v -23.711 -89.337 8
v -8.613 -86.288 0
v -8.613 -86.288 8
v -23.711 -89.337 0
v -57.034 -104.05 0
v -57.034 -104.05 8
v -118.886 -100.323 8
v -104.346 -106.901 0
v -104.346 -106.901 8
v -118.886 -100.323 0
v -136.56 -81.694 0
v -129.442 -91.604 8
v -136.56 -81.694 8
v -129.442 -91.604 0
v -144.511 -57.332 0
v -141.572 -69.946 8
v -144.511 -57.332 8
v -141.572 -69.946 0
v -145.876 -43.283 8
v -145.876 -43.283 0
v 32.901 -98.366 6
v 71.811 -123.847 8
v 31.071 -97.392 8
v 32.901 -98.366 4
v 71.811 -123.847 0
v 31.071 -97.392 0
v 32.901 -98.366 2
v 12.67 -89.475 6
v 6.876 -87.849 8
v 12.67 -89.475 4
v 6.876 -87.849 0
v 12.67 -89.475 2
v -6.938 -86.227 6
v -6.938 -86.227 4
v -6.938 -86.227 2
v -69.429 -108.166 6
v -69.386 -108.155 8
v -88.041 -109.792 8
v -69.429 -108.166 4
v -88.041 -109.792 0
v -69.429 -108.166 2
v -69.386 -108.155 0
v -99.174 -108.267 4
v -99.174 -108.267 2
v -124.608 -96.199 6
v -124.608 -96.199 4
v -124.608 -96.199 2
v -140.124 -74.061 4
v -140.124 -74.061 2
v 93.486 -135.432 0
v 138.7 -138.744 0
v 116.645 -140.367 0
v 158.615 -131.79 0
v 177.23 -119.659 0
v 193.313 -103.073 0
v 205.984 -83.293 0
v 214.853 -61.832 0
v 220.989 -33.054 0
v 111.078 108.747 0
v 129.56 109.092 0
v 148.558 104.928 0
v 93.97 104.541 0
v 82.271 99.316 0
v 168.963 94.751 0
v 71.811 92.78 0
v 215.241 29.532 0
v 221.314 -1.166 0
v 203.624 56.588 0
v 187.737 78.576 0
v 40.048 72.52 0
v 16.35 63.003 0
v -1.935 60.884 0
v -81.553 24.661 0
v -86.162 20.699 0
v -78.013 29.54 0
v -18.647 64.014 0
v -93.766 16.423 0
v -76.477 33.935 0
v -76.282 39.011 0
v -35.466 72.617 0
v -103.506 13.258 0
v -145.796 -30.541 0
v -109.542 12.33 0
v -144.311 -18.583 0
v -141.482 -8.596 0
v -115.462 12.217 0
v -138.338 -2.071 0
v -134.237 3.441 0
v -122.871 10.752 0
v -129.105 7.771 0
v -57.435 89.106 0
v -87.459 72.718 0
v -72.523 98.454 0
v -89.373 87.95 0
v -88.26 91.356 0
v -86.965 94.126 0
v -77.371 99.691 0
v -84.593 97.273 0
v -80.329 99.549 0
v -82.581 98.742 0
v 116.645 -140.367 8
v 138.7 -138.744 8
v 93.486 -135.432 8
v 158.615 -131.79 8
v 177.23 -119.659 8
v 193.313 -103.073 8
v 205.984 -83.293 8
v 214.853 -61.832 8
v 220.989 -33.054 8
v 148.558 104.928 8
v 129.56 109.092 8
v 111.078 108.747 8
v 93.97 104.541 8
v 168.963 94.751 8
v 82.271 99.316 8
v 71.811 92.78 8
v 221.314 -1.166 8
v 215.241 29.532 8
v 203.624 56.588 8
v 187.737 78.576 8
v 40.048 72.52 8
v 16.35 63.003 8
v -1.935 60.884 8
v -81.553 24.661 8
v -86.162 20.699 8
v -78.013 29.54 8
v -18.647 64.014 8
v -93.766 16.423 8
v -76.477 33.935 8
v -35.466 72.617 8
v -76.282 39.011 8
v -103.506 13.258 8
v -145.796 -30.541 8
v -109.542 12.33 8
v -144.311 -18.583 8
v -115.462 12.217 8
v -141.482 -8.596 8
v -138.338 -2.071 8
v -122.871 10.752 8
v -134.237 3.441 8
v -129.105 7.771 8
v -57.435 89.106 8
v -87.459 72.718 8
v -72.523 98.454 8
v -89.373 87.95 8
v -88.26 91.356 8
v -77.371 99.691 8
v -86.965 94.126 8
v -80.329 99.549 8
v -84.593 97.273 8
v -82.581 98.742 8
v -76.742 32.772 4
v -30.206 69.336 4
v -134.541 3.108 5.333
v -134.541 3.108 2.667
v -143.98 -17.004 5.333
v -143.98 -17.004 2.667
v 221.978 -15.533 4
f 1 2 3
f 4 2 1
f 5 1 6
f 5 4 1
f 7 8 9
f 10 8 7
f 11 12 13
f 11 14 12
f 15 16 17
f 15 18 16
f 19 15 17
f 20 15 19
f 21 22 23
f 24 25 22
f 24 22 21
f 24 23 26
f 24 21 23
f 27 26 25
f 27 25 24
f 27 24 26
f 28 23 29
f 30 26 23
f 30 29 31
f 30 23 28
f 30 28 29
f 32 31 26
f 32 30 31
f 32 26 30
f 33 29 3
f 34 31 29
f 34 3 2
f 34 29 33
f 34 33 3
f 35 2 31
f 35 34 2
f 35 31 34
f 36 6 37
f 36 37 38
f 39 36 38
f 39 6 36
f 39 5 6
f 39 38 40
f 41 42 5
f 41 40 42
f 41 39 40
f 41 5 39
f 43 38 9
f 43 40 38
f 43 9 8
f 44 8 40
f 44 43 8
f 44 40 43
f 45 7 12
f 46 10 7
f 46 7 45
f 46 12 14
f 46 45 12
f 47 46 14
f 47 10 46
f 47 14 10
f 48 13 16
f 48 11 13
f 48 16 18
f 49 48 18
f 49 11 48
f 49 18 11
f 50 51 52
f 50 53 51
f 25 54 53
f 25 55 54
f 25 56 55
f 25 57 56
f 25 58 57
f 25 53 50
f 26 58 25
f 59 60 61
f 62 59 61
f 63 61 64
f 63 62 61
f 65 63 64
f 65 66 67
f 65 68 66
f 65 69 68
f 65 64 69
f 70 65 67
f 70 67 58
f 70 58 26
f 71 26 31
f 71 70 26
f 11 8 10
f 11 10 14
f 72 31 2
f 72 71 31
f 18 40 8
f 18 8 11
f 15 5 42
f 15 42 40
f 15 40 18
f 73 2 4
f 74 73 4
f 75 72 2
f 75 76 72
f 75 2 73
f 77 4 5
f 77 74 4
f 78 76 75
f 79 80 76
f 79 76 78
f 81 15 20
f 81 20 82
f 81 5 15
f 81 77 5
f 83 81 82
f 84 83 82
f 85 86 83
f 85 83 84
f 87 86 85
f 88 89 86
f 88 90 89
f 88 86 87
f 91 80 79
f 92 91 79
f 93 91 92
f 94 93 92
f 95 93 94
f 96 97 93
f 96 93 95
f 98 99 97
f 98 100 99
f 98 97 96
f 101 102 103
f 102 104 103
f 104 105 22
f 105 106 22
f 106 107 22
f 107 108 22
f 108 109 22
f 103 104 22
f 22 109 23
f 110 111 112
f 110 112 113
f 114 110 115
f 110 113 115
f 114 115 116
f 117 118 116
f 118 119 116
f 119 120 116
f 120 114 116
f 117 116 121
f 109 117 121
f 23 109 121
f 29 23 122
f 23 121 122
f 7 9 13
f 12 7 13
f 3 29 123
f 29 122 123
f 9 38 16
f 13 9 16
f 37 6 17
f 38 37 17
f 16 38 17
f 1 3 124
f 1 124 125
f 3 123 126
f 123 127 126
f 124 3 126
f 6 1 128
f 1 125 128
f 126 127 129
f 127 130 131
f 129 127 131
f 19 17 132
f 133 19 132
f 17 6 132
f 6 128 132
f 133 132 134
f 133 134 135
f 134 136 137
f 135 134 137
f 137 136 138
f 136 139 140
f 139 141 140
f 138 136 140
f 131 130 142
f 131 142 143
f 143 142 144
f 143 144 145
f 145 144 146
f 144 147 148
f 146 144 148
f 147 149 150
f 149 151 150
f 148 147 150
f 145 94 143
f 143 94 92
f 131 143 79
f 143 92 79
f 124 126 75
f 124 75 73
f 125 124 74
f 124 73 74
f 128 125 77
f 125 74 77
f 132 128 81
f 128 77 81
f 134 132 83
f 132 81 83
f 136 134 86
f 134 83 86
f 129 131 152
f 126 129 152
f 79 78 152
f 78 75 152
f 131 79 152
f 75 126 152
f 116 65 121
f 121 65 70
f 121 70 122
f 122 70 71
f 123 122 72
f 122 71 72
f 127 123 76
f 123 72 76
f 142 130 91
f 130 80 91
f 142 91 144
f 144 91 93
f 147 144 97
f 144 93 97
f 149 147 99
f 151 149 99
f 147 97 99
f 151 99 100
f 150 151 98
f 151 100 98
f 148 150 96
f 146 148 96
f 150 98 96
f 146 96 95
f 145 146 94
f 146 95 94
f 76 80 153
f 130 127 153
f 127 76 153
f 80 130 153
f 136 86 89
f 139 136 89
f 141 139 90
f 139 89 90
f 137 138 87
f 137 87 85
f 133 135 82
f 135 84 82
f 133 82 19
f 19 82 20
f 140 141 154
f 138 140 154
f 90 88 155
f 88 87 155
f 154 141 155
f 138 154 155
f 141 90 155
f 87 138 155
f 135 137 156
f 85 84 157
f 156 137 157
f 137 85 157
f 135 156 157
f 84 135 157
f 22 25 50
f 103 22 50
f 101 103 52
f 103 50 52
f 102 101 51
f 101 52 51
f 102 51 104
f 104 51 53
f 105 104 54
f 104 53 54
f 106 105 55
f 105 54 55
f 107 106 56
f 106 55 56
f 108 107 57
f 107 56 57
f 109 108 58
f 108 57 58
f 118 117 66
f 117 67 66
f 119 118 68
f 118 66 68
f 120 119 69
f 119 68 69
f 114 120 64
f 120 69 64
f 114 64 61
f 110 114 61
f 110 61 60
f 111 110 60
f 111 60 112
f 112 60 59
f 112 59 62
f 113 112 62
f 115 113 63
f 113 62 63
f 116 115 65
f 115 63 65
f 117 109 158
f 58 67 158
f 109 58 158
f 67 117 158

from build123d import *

# Parameters (mm, degrees)
F1_DEPTH = 8


with BuildPart() as f1:
    # F0 (on Top) → F1 (new body)
    with BuildSketch(Plane.XY):
        with BuildLine():
            add(Edge.make_bspline(
                [(71.8108263604, -123.8465007597), (47.7003894889, -106.5138372126), (-7.1023466925, -67.7010548051), (-65.7469849132, -118.3312863438), (-132.354363187, -102.6557773389), (-144.8947489305, -66.4196911039), (-145.8762223824, -43.2833050614)],
                knots=[0, 0, 0, 0, 0.2870393338, 0.537090623, 0.7679648384, 1, 1, 1, 1], degree=3))
            add(Edge.make_bspline(
                [(71.8108263604, -123.8465007597), (221.9776217834, -231.7995748847), (221.9776217834, -15.5333050614), (221.9776217834, 200.732964762), (71.8108263604, 92.7798906369)],
                knots=[2.6189550017, 2.6189550017, 2.6189550017, 4.7123889804, 4.7123889804, 6.805822959, 6.805822959, 6.805822959], degree=2, weights=[1, 0.500416121, 1, 0.500416121, 1]))
            add(Edge.make_bspline(
                [(71.8108263604, 92.7798906369), (32.8723456502, 64.787494425), (-21.3027110814, 39.7461116108), (-81.2909620858, 117.5857035406), (-89.3733802445, 87.9502004857)],
                knots=[0, 0, 0, 0, 0.5650436037, 1, 1, 1, 1], degree=3))
            add(Edge.make_bspline(
                [(-89.3733802445, 87.9502004857), (-90.0934642677, 65.0933156509), (-57.859468156, 30.7219399995), (-99.6368888097, 11.3485391097), (-115.4622438558, 12.2166949386)],
                knots=[0, 0, 0, 0, 0.5319080677, 1, 1, 1, 1], degree=3))
            add(Edge.make_bspline(
                [(-115.4622438558, 12.2166949386), (-140.0598439582, 10.2222937221), (-147.0534109131, -15.5333050614), (-145.8762223824, -43.2833050614)],
                knots=[0, 0, 0, 0, 63.2871242025, 63.2871242025, 63.2871242025, 63.2871242025], degree=3))
        make_face()
        with BuildLine():
            add(Edge.make_bspline(
                [(-81.4262804577, 86.6857544237), (-81.4396250825, 86.2899525598), (-81.470808458, 84.4412359429), (-81.2371444329, 80.3732443352), (-79.8996394846, 74.5622458053), (-77.7739796116, 68.1004270996), (-75.1889101521, 61.6875748493), (-72.6363769897, 55.6379909817), (-70.5528201855, 50.214885946), (-69.2861786808, 45.7296293686), (-68.4936431345, 42.0817923462), (-68.1698884875, 39.0929607397), (-68.1533657536, 36.6406286998), (-68.2570236145, 34.6616403838), (-68.4737574041, 33.0838263382), (-68.7291671623, 31.8176398216), (-68.9833432916, 30.7603115144), (-69.2894446793, 29.7143907955), (-69.7010474162, 28.4802252803), (-70.3057430461, 26.9847588782), (-71.2217272744, 25.180071771), (-72.5057098447, 22.996441344), (-74.3801649871, 20.4643430051), (-77.1315209855, 17.5971889856), (-80.926011463, 14.2754710831), (-86.2805957531, 10.7907129486), (-92.9455256658, 7.7447804381), (-100.4062506896, 5.4313702506), (-107.2615908321, 4.1555616419), (-112.3230611682, 4.0215517798), (-114.7617028131, 4.1430335828), (-115.474366372, 4.1953856873)],
                knots=[1.0136586156, 1.0136586156, 1.0136586156, 1.0136586156, 2.2016566853, 6.5591151943, 13.1979354067, 20.0157728224, 26.9584341349, 33.9306395999, 39.7192874549, 44.3702545919, 47.8991910145, 50.9066466506, 53.369227998, 55.2496065506, 56.847005284, 58.1419089398, 59.1235009163, 60.1084144557, 61.4103265818, 63.0253022922, 64.9424016715, 67.4766146145, 70.6177002822, 74.3676557464, 79.3769786716, 85.7174213089, 93.458168517, 101.2822181349, 109.1089736004, 114.2877981192, 116.4315649936, 116.4315649936, 116.4315649936, 116.4315649936], degree=3))
            add(Edge.make_bspline(
                [(72.8103885596, 83.6341241639), (71.1240314332, 82.4184487748), (65.3211296449, 78.2511465746), (54.3822197437, 70.6703789871), (40.5843185437, 63.3369671226), (27.1044447549, 57.4124251533), (15.6068408566, 53.964757392), (5.3548644478, 52.6151050201), (-2.8177310259, 52.7103819348), (-9.6197612713, 53.363557714), (-15.7305931996, 54.5996218363), (-21.4732164128, 56.31783797), (-26.4693776174, 58.366991406), (-30.2671336771, 60.2223905595), (-33.0718752326, 61.7320886712), (-35.2053892899, 62.9792168629), (-37.3369452365, 64.2673631998), (-39.7615979324, 65.8275673276), (-42.7778265582, 67.9000785118), (-46.5332653234, 70.5849117526), (-51.0723794993, 74.0383260586), (-56.0224963865, 77.9290754702), (-61.0223620617, 81.8442891195), (-65.7064727807, 85.3502794992), (-69.7594173643, 88.139955985), (-72.9865417062, 89.9814861225), (-75.2118467434, 90.9665662194), (-76.6921868128, 91.4830508838), (-77.6909621365, 91.7169743843), (-78.3366022017, 91.7578979554), (-78.6767300882, 91.7470455298), (-78.7973913091, 91.6896137336), (-78.92482237, 91.6464959623), (-79.1937851984, 91.3963059685), (-79.6818827943, 90.8264140362), (-80.3159105632, 89.7215409417), (-80.9369473577, 88.2993059967), (-81.2772034526, 87.2085598356), (-81.4244737614, 86.692097536), (-81.4262804577, 86.6857544237)],
                knots=[4.5292135135, 4.5292135135, 4.5292135135, 4.5292135135, 10.7658667308, 25.9500108525, 44.4238690912, 57.5330245622, 70.0845168555, 80.2898579631, 88.4222588801, 94.5557392843, 100.7652771107, 107.0947805516, 112.5088206902, 116.9457400715, 119.7701488038, 122.0625237383, 124.3588459686, 127.2414612751, 130.7107153436, 135.3368293125, 141.0894801607, 147.8190536406, 154.2256313175, 160.1398760262, 165.3706560057, 168.9759235223, 171.2693919986, 172.6578901032, 173.6814113013, 174.3231622883, 174.6136969662, 174.6729508701, 174.7225491593, 175.0159838788, 175.7405361192, 176.9913533667, 178.804034025, 180.3944536329, 180.4142282457, 180.4142282457, 180.4142282457, 180.4142282457], degree=3))
            add(Edge.make_bspline(
                [(72.8103885596, 83.6341241639), (72.7317618823, 83.5699644288), (70.9554937476, 82.1155753179), (67.9804833382, 79.4874285922), (64.1756082657, 75.8169878196), (61.2913248025, 72.7059934358), (59.0477069928, 70.0999739159), (57.2057633336, 67.8641883266), (55.4110672881, 65.56108087), (53.3041635287, 62.7354150513), (50.7805389552, 59.0881516023), (47.799656336, 54.2715974255), (44.2346711733, 47.9787195772), (40.2649118491, 39.7160179142), (36.5713092348, 29.8478370438), (33.5979528322, 19.5919068023), (31.7307948184, 10.2422116085), (30.6840668384, 2.616404127), (30.0568619889, -3.4886245577), (29.7723767309, -8.3519176651), (29.6597520537, -12.2635801323), (29.6233030189, -15.5333050614), (29.6597520537, -18.8030299904), (29.7723767309, -22.7146924576), (30.0568619889, -27.577985565), (30.6840668384, -33.6830142497), (31.7307948184, -41.3088217312), (33.5979528322, -50.658516925), (36.5713092348, -60.9144471666), (40.2649118491, -70.7826280369), (44.2346711733, -79.0453296999), (47.799656336, -85.3382075482), (50.7805389552, -90.154761725), (53.3041635287, -93.802025174), (55.4110672881, -96.6276909927), (57.2057633336, -98.9307984493), (59.0477069928, -101.1665840385), (61.2913248025, -103.7726035588), (64.1756082657, -106.8835979408), (67.9804833382, -110.5540387225), (71.0158561736, -113.2355100421), (72.8564442573, -114.7385263129), (72.9977731483, -114.8532271387)],
                knots=[55.4205486123, 55.4205486123, 55.4205486123, 55.4205486123, 55.7249011544, 62.305727762, 67.3238088056, 71.5787205888, 75.0272954709, 77.639141403, 80.2683237903, 83.7858930003, 88.2122067644, 93.5690542346, 100.7734603115, 109.9018351329, 121.0375002369, 132.3448319226, 141.8998601689, 149.6118137579, 155.4302714584, 160.3068693677, 164.2227012809, 167.1693695094, 170.1160377378, 174.0318696511, 178.9084675603, 184.7269252608, 192.4388788498, 201.9939070962, 213.3012387819, 224.4369038858, 233.5652787073, 240.7696847841, 246.1265322543, 250.5528460185, 254.0704152284, 256.6995976157, 259.3114435479, 262.76001843, 267.0149302132, 272.0330112567, 278.6138378644, 279.1597054143, 279.1597054143, 279.1597054143, 279.1597054143], degree=3))
            add(Edge.make_bspline(
                [(72.9977731483, -114.8532271387), (72.4056865049, -114.4263580428), (69.0464376439, -111.9992044047), (61.9105909681, -106.8036530478), (52.1940425374, -100.414675291), (42.2398177459, -94.2326232769), (33.0541391905, -89.1692992659), (24.2243642947, -84.9672989241), (16.2683766941, -82.0032951161), (9.8318873834, -80.2250290854), (4.463169856, -79.0636225581), (-0.1263073791, -78.4111921814), (-4.1937519975, -78.1649162686), (-7.7060356334, -78.20526396), (-11.1805991563, -78.3727848605), (-15.105690951, -78.8390498977), (-19.429069468, -79.71105596), (-23.8718019577, -80.9066029792), (-28.6468717479, -82.5067792162), (-34.2116599911, -84.6249302975), (-40.8658871469, -87.6398905134), (-47.690965404, -91.0045722285), (-53.9322172369, -94.031755035), (-58.8517886529, -96.1862154004), (-62.8636912858, -97.8099974599), (-66.2287548358, -99.0112055596), (-69.174479199, -99.8882996602), (-71.7101157046, -100.5041409348), (-74.2391141536, -101.045908585), (-77.1889902033, -101.5211815466), (-80.5636006609, -101.8380782168), (-84.1498166568, -101.9648655282), (-88.1283425241, -101.8479910003), (-92.8713789939, -101.4573804411), (-98.6786686768, -100.4434986326), (-104.6143126843, -98.6675537845), (-109.8122869472, -96.3889800651), (-113.6612373405, -94.2262164294), (-116.6721363111, -92.2928397642), (-119.445929644, -90.1897015323), (-122.5417365002, -87.5069010735), (-126.0053703089, -83.7372187502), (-129.3000799141, -78.8269050802), (-132.2206720517, -72.9997696435), (-134.760402105, -65.6917432119), (-136.8528161109, -57.6024378465), (-137.649866694, -49.6245863229), (-137.8414579174, -44.9060106494), (-137.8834109174, -42.9442403412)],
                knots=[4.2858061399, 4.2858061399, 4.2858061399, 4.2858061399, 6.4754935696, 16.7181495974, 30.7634466026, 41.3498570357, 51.8646712584, 62.2141493558, 70.6575747754, 77.2977144197, 82.2304258348, 87.1280777725, 91.1888826436, 94.4417008039, 97.6615312024, 101.6210664508, 106.2864985952, 110.880412158, 115.4145221345, 121.3894131446, 128.7352744437, 137.3194350468, 144.219174491, 149.5422059689, 153.4280250406, 157.2015215054, 160.2566826573, 162.6437031168, 165.0279610064, 168.0144585226, 171.6015387383, 175.1893400883, 178.772742133, 183.5366693447, 189.4556710281, 196.4255332119, 202.067982696, 206.4456583082, 209.6586104968, 212.7949457303, 216.8805616296, 221.934808933, 228.1024059287, 234.5573044306, 241.4332004742, 251.2825478576, 259.5402388761, 265.4359196068, 265.4359196068, 265.4359196068, 265.4359196068], degree=3))
            add(Edge.make_bspline(
                [(-115.474366372, 4.1953856873), (-115.654699102, 4.1804409153), (-116.5836359717, 4.0950636678), (-118.5079216061, 3.8241612148), (-121.094735833, 3.0439396902), (-123.6838235375, 1.8597581111), (-125.9853889989, 0.3481336416), (-128.0619952594, -1.4951736511), (-129.9535460087, -3.6932073495), (-131.8514714309, -6.5803447016), (-133.9637161202, -10.6180046655), (-136.0486166412, -16.5975276115), (-137.4710871628, -24.3656867863), (-138.1549681717, -32.3234699475), (-138.079170547, -38.6118374717), (-137.939859331, -41.8534729549), (-137.8834109174, -42.9442403412)],
                knots=[0.6605528161, 0.6605528161, 0.6605528161, 0.6605528161, 1.2032828879, 3.4574616871, 6.4791602651, 9.2718264149, 11.9726703823, 14.7076610425, 17.5762809491, 20.6455316793, 25.0544251668, 31.2157003257, 39.5600454386, 48.6812593878, 55.1351477368, 58.4131045259, 58.4131045259, 58.4131045259, 58.4131045259], degree=3))
        make_face(mode=Mode.SUBTRACT)
        with BuildLine():
            add(Edge.make_bspline(
                [(72.8103885596, 83.6341241639), (71.1240314332, 82.4184487748), (65.3211296449, 78.2511465746), (54.3822197437, 70.6703789871), (40.5843185437, 63.3369671226), (27.1044447549, 57.4124251533), (15.6068408566, 53.964757392), (5.3548644478, 52.6151050201), (-2.8177310259, 52.7103819348), (-9.6197612713, 53.363557714), (-15.7305931996, 54.5996218363), (-21.4732164128, 56.31783797), (-26.4693776174, 58.366991406), (-30.2671336771, 60.2223905595), (-33.0718752326, 61.7320886712), (-35.2053892899, 62.9792168629), (-37.3369452365, 64.2673631998), (-39.7615979324, 65.8275673276), (-42.7778265582, 67.9000785118), (-46.5332653234, 70.5849117526), (-51.0723794993, 74.0383260586), (-56.0224963865, 77.9290754702), (-61.0223620617, 81.8442891195), (-65.7064727807, 85.3502794992), (-69.7594173643, 88.139955985), (-72.9865417062, 89.9814861225), (-75.2118467434, 90.9665662194), (-76.6921868128, 91.4830508838), (-77.6909621365, 91.7169743843), (-78.3366022017, 91.7578979554), (-78.6767300882, 91.7470455298), (-78.7973913091, 91.6896137336), (-78.92482237, 91.6464959623), (-79.1937851984, 91.3963059685), (-79.6818827943, 90.8264140362), (-80.3159105632, 89.7215409417), (-80.9369473577, 88.2993059967), (-81.2772034526, 87.2085598356), (-81.4244737614, 86.692097536), (-81.4262804577, 86.6857544237)],
                knots=[4.5292135135, 4.5292135135, 4.5292135135, 4.5292135135, 10.7658667308, 25.9500108525, 44.4238690912, 57.5330245622, 70.0845168555, 80.2898579631, 88.4222588801, 94.5557392843, 100.7652771107, 107.0947805516, 112.5088206902, 116.9457400715, 119.7701488038, 122.0625237383, 124.3588459686, 127.2414612751, 130.7107153436, 135.3368293125, 141.0894801607, 147.8190536406, 154.2256313175, 160.1398760262, 165.3706560057, 168.9759235223, 171.2693919986, 172.6578901032, 173.6814113013, 174.3231622883, 174.6136969662, 174.6729508701, 174.7225491593, 175.0159838788, 175.7405361192, 176.9913533667, 178.804034025, 180.3944536329, 180.4142282457, 180.4142282457, 180.4142282457, 180.4142282457], degree=3))
            add(Edge.make_bspline(
                [(-81.4262804577, 86.6857544237), (-81.4396250825, 86.2899525598), (-81.470808458, 84.4412359429), (-81.2371444329, 80.3732443352), (-79.8996394846, 74.5622458053), (-77.7739796116, 68.1004270996), (-75.1889101521, 61.6875748493), (-72.6363769897, 55.6379909817), (-70.5528201855, 50.214885946), (-69.2861786808, 45.7296293686), (-68.4936431345, 42.0817923462), (-68.1698884875, 39.0929607397), (-68.1533657536, 36.6406286998), (-68.2570236145, 34.6616403838), (-68.4737574041, 33.0838263382), (-68.7291671623, 31.8176398216), (-68.9833432916, 30.7603115144), (-69.2894446793, 29.7143907955), (-69.7010474162, 28.4802252803), (-70.3057430461, 26.9847588782), (-71.2217272744, 25.180071771), (-72.5057098447, 22.996441344), (-74.3801649871, 20.4643430051), (-77.1315209855, 17.5971889856), (-80.926011463, 14.2754710831), (-86.2805957531, 10.7907129486), (-92.9455256658, 7.7447804381), (-100.4062506896, 5.4313702506), (-107.2615908321, 4.1555616419), (-112.3230611682, 4.0215517798), (-114.7617028131, 4.1430335828), (-115.474366372, 4.1953856873)],
                knots=[1.0136586156, 1.0136586156, 1.0136586156, 1.0136586156, 2.2016566853, 6.5591151943, 13.1979354067, 20.0157728224, 26.9584341349, 33.9306395999, 39.7192874549, 44.3702545919, 47.8991910145, 50.9066466506, 53.369227998, 55.2496065506, 56.847005284, 58.1419089398, 59.1235009163, 60.1084144557, 61.4103265818, 63.0253022922, 64.9424016715, 67.4766146145, 70.6177002822, 74.3676557464, 79.3769786716, 85.7174213089, 93.458168517, 101.2822181349, 109.1089736004, 114.2877981192, 116.4315649936, 116.4315649936, 116.4315649936, 116.4315649936], degree=3))
            add(Edge.make_bspline(
                [(-115.474366372, 4.1953856873), (-115.654699102, 4.1804409153), (-116.5836359717, 4.0950636678), (-118.5079216061, 3.8241612148), (-121.094735833, 3.0439396902), (-123.6838235375, 1.8597581111), (-125.9853889989, 0.3481336416), (-128.0619952594, -1.4951736511), (-129.9535460087, -3.6932073495), (-131.8514714309, -6.5803447016), (-133.9637161202, -10.6180046655), (-136.0486166412, -16.5975276115), (-137.4710871628, -24.3656867863), (-138.1549681717, -32.3234699475), (-138.079170547, -38.6118374717), (-137.939859331, -41.8534729549), (-137.8834109174, -42.9442403412)],
                knots=[0.6605528161, 0.6605528161, 0.6605528161, 0.6605528161, 1.2032828879, 3.4574616871, 6.4791602651, 9.2718264149, 11.9726703823, 14.7076610425, 17.5762809491, 20.6455316793, 25.0544251668, 31.2157003257, 39.5600454386, 48.6812593878, 55.1351477368, 58.4131045259, 58.4131045259, 58.4131045259, 58.4131045259], degree=3))
            add(Edge.make_bspline(
                [(72.9977731483, -114.8532271387), (72.4056865049, -114.4263580428), (69.0464376439, -111.9992044047), (61.9105909681, -106.8036530478), (52.1940425374, -100.414675291), (42.2398177459, -94.2326232769), (33.0541391905, -89.1692992659), (24.2243642947, -84.9672989241), (16.2683766941, -82.0032951161), (9.8318873834, -80.2250290854), (4.463169856, -79.0636225581), (-0.1263073791, -78.4111921814), (-4.1937519975, -78.1649162686), (-7.7060356334, -78.20526396), (-11.1805991563, -78.3727848605), (-15.105690951, -78.8390498977), (-19.429069468, -79.71105596), (-23.8718019577, -80.9066029792), (-28.6468717479, -82.5067792162), (-34.2116599911, -84.6249302975), (-40.8658871469, -87.6398905134), (-47.690965404, -91.0045722285), (-53.9322172369, -94.031755035), (-58.8517886529, -96.1862154004), (-62.8636912858, -97.8099974599), (-66.2287548358, -99.0112055596), (-69.174479199, -99.8882996602), (-71.7101157046, -100.5041409348), (-74.2391141536, -101.045908585), (-77.1889902033, -101.5211815466), (-80.5636006609, -101.8380782168), (-84.1498166568, -101.9648655282), (-88.1283425241, -101.8479910003), (-92.8713789939, -101.4573804411), (-98.6786686768, -100.4434986326), (-104.6143126843, -98.6675537845), (-109.8122869472, -96.3889800651), (-113.6612373405, -94.2262164294), (-116.6721363111, -92.2928397642), (-119.445929644, -90.1897015323), (-122.5417365002, -87.5069010735), (-126.0053703089, -83.7372187502), (-129.3000799141, -78.8269050802), (-132.2206720517, -72.9997696435), (-134.760402105, -65.6917432119), (-136.8528161109, -57.6024378465), (-137.649866694, -49.6245863229), (-137.8414579174, -44.9060106494), (-137.8834109174, -42.9442403412)],
                knots=[4.2858061399, 4.2858061399, 4.2858061399, 4.2858061399, 6.4754935696, 16.7181495974, 30.7634466026, 41.3498570357, 51.8646712584, 62.2141493558, 70.6575747754, 77.2977144197, 82.2304258348, 87.1280777725, 91.1888826436, 94.4417008039, 97.6615312024, 101.6210664508, 106.2864985952, 110.880412158, 115.4145221345, 121.3894131446, 128.7352744437, 137.3194350468, 144.219174491, 149.5422059689, 153.4280250406, 157.2015215054, 160.2566826573, 162.6437031168, 165.0279610064, 168.0144585226, 171.6015387383, 175.1893400883, 178.772742133, 183.5366693447, 189.4556710281, 196.4255332119, 202.067982696, 206.4456583082, 209.6586104968, 212.7949457303, 216.8805616296, 221.934808933, 228.1024059287, 234.5573044306, 241.4332004742, 251.2825478576, 259.5402388761, 265.4359196068, 265.4359196068, 265.4359196068, 265.4359196068], degree=3))
            add(Edge.make_bspline(
                [(72.8103885596, 83.6341241639), (72.7317618823, 83.5699644288), (70.9554937476, 82.1155753179), (67.9804833382, 79.4874285922), (64.1756082657, 75.8169878196), (61.2913248025, 72.7059934358), (59.0477069928, 70.0999739159), (57.2057633336, 67.8641883266), (55.4110672881, 65.56108087), (53.3041635287, 62.7354150513), (50.7805389552, 59.0881516023), (47.799656336, 54.2715974255), (44.2346711733, 47.9787195772), (40.2649118491, 39.7160179142), (36.5713092348, 29.8478370438), (33.5979528322, 19.5919068023), (31.7307948184, 10.2422116085), (30.6840668384, 2.616404127), (30.0568619889, -3.4886245577), (29.7723767309, -8.3519176651), (29.6597520537, -12.2635801323), (29.6233030189, -15.5333050614), (29.6597520537, -18.8030299904), (29.7723767309, -22.7146924576), (30.0568619889, -27.577985565), (30.6840668384, -33.6830142497), (31.7307948184, -41.3088217312), (33.5979528322, -50.658516925), (36.5713092348, -60.9144471666), (40.2649118491, -70.7826280369), (44.2346711733, -79.0453296999), (47.799656336, -85.3382075482), (50.7805389552, -90.154761725), (53.3041635287, -93.802025174), (55.4110672881, -96.6276909927), (57.2057633336, -98.9307984493), (59.0477069928, -101.1665840385), (61.2913248025, -103.7726035588), (64.1756082657, -106.8835979408), (67.9804833382, -110.5540387225), (71.0158561736, -113.2355100421), (72.8564442573, -114.7385263129), (72.9977731483, -114.8532271387)],
                knots=[55.4205486123, 55.4205486123, 55.4205486123, 55.4205486123, 55.7249011544, 62.305727762, 67.3238088056, 71.5787205888, 75.0272954709, 77.639141403, 80.2683237903, 83.7858930003, 88.2122067644, 93.5690542346, 100.7734603115, 109.9018351329, 121.0375002369, 132.3448319226, 141.8998601689, 149.6118137579, 155.4302714584, 160.3068693677, 164.2227012809, 167.1693695094, 170.1160377378, 174.0318696511, 178.9084675603, 184.7269252608, 192.4388788498, 201.9939070962, 213.3012387819, 224.4369038858, 233.5652787073, 240.7696847841, 246.1265322543, 250.5528460185, 254.0704152284, 256.6995976157, 259.3114435479, 262.76001843, 267.0149302132, 272.0330112567, 278.6138378644, 279.1597054143, 279.1597054143, 279.1597054143, 279.1597054143], degree=3))
        make_face()
    extrude(amount=F1_DEPTH)


solid = f1.part
